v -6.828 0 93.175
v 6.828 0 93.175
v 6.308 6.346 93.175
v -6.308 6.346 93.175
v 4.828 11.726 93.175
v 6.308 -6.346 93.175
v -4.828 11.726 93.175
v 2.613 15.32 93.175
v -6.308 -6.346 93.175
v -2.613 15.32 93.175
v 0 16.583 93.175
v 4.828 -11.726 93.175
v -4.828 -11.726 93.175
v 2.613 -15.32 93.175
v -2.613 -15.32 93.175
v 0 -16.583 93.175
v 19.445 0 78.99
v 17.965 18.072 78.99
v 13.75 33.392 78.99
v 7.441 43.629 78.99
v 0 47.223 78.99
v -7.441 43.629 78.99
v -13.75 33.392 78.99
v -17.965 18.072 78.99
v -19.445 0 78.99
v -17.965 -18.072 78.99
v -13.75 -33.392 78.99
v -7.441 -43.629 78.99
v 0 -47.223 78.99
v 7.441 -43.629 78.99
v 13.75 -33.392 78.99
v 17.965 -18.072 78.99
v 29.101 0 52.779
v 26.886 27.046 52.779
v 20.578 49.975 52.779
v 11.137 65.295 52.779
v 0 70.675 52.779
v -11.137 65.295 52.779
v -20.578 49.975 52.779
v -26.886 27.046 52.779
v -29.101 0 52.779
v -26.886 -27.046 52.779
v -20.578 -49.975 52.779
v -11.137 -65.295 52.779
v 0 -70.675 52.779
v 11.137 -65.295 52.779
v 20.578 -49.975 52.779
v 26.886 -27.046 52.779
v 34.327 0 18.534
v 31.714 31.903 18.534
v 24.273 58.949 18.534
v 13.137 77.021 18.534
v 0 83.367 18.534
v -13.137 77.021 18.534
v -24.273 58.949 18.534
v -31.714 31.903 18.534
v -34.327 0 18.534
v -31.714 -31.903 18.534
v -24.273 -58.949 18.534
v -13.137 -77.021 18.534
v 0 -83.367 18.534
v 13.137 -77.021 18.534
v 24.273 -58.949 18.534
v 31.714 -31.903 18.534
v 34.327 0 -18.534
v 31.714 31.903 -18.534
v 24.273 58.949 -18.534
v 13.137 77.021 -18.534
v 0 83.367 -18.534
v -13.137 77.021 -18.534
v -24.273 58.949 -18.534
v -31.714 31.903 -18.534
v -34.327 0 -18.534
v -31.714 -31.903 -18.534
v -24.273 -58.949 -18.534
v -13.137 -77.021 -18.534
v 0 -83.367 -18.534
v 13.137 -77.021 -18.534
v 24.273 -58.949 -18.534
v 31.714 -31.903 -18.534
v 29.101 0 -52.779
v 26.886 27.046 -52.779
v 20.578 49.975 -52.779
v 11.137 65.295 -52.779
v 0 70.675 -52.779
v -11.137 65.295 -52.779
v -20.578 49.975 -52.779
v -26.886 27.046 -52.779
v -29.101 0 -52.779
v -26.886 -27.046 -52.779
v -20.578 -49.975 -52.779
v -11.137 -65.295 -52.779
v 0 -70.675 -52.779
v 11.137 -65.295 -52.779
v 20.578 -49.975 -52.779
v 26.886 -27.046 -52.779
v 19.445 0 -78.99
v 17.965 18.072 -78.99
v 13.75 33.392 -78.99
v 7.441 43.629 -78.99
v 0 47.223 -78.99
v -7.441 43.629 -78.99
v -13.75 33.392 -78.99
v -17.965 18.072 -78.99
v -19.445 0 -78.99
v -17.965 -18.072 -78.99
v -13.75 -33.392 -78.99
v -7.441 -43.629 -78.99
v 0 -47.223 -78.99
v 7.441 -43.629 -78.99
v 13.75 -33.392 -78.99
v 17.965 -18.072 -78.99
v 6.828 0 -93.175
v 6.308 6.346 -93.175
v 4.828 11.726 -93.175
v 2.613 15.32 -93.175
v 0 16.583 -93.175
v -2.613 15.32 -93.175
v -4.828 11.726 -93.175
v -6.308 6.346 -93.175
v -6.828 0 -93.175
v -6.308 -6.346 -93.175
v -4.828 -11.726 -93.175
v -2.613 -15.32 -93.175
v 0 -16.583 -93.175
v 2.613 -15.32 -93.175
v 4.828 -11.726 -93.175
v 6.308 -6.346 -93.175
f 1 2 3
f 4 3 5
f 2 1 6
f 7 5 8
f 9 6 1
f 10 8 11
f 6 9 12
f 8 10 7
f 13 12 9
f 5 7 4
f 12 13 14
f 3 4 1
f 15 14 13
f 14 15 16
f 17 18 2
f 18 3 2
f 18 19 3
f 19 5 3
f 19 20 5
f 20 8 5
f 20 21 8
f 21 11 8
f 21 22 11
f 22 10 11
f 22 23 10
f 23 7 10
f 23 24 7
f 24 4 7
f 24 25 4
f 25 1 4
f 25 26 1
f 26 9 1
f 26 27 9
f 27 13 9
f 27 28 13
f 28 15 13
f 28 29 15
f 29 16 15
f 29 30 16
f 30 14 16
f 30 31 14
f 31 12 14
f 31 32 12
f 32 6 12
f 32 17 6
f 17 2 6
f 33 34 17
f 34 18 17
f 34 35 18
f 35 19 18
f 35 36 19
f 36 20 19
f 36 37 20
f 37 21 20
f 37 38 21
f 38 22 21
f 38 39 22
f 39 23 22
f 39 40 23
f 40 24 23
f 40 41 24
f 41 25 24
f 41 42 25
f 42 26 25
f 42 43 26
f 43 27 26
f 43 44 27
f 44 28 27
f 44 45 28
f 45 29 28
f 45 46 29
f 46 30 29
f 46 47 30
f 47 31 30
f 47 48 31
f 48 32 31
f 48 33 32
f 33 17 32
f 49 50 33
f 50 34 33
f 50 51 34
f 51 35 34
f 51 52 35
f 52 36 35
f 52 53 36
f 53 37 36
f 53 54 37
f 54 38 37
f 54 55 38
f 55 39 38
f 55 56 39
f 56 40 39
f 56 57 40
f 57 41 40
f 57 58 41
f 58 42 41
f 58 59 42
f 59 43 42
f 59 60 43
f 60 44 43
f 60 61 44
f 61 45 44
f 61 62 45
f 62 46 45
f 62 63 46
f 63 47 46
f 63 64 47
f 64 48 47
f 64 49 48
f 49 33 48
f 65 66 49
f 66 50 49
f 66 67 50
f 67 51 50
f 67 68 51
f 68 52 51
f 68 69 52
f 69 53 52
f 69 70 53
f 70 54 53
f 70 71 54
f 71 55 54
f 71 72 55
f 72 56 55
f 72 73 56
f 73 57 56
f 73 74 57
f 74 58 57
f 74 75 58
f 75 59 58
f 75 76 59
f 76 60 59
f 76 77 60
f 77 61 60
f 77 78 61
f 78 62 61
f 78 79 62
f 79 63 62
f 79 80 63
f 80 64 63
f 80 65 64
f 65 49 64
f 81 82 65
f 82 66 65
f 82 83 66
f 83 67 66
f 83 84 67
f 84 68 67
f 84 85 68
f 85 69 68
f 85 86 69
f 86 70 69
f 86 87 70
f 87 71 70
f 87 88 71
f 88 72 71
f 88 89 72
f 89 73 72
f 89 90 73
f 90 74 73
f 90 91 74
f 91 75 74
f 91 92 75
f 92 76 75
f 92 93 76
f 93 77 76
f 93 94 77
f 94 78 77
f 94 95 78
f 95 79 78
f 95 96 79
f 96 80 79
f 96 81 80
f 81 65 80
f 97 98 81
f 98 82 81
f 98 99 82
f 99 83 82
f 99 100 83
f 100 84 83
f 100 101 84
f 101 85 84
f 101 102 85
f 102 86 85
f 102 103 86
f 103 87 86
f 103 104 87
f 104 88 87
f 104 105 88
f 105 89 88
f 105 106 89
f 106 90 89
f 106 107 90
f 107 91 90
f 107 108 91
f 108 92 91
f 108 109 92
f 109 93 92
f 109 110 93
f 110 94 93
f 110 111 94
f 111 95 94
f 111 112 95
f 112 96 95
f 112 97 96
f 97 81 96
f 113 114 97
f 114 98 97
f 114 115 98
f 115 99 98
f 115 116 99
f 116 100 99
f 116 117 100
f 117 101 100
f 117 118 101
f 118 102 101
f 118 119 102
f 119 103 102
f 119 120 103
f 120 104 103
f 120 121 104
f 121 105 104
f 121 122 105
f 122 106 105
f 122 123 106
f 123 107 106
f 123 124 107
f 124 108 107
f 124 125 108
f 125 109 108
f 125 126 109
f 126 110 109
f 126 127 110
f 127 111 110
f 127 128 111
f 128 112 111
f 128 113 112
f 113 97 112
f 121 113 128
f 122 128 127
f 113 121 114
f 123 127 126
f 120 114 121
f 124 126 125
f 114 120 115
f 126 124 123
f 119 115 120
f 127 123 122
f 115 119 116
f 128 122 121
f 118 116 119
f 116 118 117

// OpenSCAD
// Generated by SolidPython 1.0.1 on 2020-07-29 00:46:48


scale(v = [7, 17, 19]) {
	sphere(r = 5);
}
/***********************************************
*********      SolidPython code:      **********
************************************************
 
# import packages: SolidPython
from solid import *
from solid.utils import *
from itertools import chain, combinations, permutations


class Resize:

    def __init__(self, scad_file):
        self.scad_file = scad_file
        #self.scad_file = import_scad(scad_file)
        # cone/cylinder param:
        self.r1 = 0
        self.r2 = 0
        self.h = 0
        # rectangular prism param:
        self.w = 0
        self.l = 0
        # ellipse param:
        self.r = 0

    # import OpenScad code (file name corresponds to shape)


    # classify shape + parameters
    def assign(self, param1, param2, param3):
        if self.scad_file == 'cone.scad':
            self.r1 = param1
            self.r2 = param2
            self.h = param3
        elif self.scad_file == 'cylinder.scad':
            self.r1 = param1
            self.r2 = param2
            self.h = param3
        elif self.scad_file == 'rectangularPrism.scad':
            self.h = param1
            self.l = param2
            self.w = param3
        else:
            self.r = param1
            self.h = param2

    # resize parameters
    def iterate(self):
        x = range(3, 20, 2)
        i = 1
        if self.scad_file == 'cone.scad':
            tempList = list(permutations(x, 2))
            for temp in tempList:
                param1 = temp[0]
                param2 = temp[1]
                filepath = 'produced_scad_files/' + 'cone' + str(param1) + '_' + str(param2) + '_' + '.scad'
                scad_render_to_file(cylinder(h=param1, r1=param2, r2=0), filepath)

        elif self.scad_file == 'cylinder.scad':
            tempList = list(permutations(x, 3))
            for temp in tempList:
                param1 = temp[0]
                param2 = temp[1]
                filepath = 'produced_scad_files/' + 'cylinder' + str(param1) + '_' + str(param2) + '_' + '.scad'
                scad_render_to_file(cylinder(h=param1, r1=param2, r2=param2), filepath)

        elif self.scad_file == 'rectangularPrism.scad':
            tempList = list(permutations(x, 3))
            for temp in tempList:
                param1 = temp[0]
                param2 = temp[1]
                param3 = temp[2]
                filepath = 'produced_scad_files/' + 'rectangularPrism' + str(param1) + '_' + str(param2) + '_' + str(
                    param3) + '.scad'
                scad_render_to_file(cube(size=(param1, param2, param3)), filepath)

        elif self.scad_file == 'ellipse.scad':
            tempList = list(permutations(x, 4))
            for temp in tempList:
                param1 = temp[0]
                param2 = temp[1]
                param3 = temp[2]
                param4 = temp[3]
                filepath = 'produced_scad_files/' + 'ellipse' + str(param1) + '_' + str(param2) + '_' + str(param3) + '_' + str(param4) + '.scad'
                scad_render_to_file(scale([param1, param2, param3])(sphere(r=param4)), filepath)

    def render_to_scadfile(self):
        scad_render_to_file(scad, 'example.scad') 
 
************************************************/
